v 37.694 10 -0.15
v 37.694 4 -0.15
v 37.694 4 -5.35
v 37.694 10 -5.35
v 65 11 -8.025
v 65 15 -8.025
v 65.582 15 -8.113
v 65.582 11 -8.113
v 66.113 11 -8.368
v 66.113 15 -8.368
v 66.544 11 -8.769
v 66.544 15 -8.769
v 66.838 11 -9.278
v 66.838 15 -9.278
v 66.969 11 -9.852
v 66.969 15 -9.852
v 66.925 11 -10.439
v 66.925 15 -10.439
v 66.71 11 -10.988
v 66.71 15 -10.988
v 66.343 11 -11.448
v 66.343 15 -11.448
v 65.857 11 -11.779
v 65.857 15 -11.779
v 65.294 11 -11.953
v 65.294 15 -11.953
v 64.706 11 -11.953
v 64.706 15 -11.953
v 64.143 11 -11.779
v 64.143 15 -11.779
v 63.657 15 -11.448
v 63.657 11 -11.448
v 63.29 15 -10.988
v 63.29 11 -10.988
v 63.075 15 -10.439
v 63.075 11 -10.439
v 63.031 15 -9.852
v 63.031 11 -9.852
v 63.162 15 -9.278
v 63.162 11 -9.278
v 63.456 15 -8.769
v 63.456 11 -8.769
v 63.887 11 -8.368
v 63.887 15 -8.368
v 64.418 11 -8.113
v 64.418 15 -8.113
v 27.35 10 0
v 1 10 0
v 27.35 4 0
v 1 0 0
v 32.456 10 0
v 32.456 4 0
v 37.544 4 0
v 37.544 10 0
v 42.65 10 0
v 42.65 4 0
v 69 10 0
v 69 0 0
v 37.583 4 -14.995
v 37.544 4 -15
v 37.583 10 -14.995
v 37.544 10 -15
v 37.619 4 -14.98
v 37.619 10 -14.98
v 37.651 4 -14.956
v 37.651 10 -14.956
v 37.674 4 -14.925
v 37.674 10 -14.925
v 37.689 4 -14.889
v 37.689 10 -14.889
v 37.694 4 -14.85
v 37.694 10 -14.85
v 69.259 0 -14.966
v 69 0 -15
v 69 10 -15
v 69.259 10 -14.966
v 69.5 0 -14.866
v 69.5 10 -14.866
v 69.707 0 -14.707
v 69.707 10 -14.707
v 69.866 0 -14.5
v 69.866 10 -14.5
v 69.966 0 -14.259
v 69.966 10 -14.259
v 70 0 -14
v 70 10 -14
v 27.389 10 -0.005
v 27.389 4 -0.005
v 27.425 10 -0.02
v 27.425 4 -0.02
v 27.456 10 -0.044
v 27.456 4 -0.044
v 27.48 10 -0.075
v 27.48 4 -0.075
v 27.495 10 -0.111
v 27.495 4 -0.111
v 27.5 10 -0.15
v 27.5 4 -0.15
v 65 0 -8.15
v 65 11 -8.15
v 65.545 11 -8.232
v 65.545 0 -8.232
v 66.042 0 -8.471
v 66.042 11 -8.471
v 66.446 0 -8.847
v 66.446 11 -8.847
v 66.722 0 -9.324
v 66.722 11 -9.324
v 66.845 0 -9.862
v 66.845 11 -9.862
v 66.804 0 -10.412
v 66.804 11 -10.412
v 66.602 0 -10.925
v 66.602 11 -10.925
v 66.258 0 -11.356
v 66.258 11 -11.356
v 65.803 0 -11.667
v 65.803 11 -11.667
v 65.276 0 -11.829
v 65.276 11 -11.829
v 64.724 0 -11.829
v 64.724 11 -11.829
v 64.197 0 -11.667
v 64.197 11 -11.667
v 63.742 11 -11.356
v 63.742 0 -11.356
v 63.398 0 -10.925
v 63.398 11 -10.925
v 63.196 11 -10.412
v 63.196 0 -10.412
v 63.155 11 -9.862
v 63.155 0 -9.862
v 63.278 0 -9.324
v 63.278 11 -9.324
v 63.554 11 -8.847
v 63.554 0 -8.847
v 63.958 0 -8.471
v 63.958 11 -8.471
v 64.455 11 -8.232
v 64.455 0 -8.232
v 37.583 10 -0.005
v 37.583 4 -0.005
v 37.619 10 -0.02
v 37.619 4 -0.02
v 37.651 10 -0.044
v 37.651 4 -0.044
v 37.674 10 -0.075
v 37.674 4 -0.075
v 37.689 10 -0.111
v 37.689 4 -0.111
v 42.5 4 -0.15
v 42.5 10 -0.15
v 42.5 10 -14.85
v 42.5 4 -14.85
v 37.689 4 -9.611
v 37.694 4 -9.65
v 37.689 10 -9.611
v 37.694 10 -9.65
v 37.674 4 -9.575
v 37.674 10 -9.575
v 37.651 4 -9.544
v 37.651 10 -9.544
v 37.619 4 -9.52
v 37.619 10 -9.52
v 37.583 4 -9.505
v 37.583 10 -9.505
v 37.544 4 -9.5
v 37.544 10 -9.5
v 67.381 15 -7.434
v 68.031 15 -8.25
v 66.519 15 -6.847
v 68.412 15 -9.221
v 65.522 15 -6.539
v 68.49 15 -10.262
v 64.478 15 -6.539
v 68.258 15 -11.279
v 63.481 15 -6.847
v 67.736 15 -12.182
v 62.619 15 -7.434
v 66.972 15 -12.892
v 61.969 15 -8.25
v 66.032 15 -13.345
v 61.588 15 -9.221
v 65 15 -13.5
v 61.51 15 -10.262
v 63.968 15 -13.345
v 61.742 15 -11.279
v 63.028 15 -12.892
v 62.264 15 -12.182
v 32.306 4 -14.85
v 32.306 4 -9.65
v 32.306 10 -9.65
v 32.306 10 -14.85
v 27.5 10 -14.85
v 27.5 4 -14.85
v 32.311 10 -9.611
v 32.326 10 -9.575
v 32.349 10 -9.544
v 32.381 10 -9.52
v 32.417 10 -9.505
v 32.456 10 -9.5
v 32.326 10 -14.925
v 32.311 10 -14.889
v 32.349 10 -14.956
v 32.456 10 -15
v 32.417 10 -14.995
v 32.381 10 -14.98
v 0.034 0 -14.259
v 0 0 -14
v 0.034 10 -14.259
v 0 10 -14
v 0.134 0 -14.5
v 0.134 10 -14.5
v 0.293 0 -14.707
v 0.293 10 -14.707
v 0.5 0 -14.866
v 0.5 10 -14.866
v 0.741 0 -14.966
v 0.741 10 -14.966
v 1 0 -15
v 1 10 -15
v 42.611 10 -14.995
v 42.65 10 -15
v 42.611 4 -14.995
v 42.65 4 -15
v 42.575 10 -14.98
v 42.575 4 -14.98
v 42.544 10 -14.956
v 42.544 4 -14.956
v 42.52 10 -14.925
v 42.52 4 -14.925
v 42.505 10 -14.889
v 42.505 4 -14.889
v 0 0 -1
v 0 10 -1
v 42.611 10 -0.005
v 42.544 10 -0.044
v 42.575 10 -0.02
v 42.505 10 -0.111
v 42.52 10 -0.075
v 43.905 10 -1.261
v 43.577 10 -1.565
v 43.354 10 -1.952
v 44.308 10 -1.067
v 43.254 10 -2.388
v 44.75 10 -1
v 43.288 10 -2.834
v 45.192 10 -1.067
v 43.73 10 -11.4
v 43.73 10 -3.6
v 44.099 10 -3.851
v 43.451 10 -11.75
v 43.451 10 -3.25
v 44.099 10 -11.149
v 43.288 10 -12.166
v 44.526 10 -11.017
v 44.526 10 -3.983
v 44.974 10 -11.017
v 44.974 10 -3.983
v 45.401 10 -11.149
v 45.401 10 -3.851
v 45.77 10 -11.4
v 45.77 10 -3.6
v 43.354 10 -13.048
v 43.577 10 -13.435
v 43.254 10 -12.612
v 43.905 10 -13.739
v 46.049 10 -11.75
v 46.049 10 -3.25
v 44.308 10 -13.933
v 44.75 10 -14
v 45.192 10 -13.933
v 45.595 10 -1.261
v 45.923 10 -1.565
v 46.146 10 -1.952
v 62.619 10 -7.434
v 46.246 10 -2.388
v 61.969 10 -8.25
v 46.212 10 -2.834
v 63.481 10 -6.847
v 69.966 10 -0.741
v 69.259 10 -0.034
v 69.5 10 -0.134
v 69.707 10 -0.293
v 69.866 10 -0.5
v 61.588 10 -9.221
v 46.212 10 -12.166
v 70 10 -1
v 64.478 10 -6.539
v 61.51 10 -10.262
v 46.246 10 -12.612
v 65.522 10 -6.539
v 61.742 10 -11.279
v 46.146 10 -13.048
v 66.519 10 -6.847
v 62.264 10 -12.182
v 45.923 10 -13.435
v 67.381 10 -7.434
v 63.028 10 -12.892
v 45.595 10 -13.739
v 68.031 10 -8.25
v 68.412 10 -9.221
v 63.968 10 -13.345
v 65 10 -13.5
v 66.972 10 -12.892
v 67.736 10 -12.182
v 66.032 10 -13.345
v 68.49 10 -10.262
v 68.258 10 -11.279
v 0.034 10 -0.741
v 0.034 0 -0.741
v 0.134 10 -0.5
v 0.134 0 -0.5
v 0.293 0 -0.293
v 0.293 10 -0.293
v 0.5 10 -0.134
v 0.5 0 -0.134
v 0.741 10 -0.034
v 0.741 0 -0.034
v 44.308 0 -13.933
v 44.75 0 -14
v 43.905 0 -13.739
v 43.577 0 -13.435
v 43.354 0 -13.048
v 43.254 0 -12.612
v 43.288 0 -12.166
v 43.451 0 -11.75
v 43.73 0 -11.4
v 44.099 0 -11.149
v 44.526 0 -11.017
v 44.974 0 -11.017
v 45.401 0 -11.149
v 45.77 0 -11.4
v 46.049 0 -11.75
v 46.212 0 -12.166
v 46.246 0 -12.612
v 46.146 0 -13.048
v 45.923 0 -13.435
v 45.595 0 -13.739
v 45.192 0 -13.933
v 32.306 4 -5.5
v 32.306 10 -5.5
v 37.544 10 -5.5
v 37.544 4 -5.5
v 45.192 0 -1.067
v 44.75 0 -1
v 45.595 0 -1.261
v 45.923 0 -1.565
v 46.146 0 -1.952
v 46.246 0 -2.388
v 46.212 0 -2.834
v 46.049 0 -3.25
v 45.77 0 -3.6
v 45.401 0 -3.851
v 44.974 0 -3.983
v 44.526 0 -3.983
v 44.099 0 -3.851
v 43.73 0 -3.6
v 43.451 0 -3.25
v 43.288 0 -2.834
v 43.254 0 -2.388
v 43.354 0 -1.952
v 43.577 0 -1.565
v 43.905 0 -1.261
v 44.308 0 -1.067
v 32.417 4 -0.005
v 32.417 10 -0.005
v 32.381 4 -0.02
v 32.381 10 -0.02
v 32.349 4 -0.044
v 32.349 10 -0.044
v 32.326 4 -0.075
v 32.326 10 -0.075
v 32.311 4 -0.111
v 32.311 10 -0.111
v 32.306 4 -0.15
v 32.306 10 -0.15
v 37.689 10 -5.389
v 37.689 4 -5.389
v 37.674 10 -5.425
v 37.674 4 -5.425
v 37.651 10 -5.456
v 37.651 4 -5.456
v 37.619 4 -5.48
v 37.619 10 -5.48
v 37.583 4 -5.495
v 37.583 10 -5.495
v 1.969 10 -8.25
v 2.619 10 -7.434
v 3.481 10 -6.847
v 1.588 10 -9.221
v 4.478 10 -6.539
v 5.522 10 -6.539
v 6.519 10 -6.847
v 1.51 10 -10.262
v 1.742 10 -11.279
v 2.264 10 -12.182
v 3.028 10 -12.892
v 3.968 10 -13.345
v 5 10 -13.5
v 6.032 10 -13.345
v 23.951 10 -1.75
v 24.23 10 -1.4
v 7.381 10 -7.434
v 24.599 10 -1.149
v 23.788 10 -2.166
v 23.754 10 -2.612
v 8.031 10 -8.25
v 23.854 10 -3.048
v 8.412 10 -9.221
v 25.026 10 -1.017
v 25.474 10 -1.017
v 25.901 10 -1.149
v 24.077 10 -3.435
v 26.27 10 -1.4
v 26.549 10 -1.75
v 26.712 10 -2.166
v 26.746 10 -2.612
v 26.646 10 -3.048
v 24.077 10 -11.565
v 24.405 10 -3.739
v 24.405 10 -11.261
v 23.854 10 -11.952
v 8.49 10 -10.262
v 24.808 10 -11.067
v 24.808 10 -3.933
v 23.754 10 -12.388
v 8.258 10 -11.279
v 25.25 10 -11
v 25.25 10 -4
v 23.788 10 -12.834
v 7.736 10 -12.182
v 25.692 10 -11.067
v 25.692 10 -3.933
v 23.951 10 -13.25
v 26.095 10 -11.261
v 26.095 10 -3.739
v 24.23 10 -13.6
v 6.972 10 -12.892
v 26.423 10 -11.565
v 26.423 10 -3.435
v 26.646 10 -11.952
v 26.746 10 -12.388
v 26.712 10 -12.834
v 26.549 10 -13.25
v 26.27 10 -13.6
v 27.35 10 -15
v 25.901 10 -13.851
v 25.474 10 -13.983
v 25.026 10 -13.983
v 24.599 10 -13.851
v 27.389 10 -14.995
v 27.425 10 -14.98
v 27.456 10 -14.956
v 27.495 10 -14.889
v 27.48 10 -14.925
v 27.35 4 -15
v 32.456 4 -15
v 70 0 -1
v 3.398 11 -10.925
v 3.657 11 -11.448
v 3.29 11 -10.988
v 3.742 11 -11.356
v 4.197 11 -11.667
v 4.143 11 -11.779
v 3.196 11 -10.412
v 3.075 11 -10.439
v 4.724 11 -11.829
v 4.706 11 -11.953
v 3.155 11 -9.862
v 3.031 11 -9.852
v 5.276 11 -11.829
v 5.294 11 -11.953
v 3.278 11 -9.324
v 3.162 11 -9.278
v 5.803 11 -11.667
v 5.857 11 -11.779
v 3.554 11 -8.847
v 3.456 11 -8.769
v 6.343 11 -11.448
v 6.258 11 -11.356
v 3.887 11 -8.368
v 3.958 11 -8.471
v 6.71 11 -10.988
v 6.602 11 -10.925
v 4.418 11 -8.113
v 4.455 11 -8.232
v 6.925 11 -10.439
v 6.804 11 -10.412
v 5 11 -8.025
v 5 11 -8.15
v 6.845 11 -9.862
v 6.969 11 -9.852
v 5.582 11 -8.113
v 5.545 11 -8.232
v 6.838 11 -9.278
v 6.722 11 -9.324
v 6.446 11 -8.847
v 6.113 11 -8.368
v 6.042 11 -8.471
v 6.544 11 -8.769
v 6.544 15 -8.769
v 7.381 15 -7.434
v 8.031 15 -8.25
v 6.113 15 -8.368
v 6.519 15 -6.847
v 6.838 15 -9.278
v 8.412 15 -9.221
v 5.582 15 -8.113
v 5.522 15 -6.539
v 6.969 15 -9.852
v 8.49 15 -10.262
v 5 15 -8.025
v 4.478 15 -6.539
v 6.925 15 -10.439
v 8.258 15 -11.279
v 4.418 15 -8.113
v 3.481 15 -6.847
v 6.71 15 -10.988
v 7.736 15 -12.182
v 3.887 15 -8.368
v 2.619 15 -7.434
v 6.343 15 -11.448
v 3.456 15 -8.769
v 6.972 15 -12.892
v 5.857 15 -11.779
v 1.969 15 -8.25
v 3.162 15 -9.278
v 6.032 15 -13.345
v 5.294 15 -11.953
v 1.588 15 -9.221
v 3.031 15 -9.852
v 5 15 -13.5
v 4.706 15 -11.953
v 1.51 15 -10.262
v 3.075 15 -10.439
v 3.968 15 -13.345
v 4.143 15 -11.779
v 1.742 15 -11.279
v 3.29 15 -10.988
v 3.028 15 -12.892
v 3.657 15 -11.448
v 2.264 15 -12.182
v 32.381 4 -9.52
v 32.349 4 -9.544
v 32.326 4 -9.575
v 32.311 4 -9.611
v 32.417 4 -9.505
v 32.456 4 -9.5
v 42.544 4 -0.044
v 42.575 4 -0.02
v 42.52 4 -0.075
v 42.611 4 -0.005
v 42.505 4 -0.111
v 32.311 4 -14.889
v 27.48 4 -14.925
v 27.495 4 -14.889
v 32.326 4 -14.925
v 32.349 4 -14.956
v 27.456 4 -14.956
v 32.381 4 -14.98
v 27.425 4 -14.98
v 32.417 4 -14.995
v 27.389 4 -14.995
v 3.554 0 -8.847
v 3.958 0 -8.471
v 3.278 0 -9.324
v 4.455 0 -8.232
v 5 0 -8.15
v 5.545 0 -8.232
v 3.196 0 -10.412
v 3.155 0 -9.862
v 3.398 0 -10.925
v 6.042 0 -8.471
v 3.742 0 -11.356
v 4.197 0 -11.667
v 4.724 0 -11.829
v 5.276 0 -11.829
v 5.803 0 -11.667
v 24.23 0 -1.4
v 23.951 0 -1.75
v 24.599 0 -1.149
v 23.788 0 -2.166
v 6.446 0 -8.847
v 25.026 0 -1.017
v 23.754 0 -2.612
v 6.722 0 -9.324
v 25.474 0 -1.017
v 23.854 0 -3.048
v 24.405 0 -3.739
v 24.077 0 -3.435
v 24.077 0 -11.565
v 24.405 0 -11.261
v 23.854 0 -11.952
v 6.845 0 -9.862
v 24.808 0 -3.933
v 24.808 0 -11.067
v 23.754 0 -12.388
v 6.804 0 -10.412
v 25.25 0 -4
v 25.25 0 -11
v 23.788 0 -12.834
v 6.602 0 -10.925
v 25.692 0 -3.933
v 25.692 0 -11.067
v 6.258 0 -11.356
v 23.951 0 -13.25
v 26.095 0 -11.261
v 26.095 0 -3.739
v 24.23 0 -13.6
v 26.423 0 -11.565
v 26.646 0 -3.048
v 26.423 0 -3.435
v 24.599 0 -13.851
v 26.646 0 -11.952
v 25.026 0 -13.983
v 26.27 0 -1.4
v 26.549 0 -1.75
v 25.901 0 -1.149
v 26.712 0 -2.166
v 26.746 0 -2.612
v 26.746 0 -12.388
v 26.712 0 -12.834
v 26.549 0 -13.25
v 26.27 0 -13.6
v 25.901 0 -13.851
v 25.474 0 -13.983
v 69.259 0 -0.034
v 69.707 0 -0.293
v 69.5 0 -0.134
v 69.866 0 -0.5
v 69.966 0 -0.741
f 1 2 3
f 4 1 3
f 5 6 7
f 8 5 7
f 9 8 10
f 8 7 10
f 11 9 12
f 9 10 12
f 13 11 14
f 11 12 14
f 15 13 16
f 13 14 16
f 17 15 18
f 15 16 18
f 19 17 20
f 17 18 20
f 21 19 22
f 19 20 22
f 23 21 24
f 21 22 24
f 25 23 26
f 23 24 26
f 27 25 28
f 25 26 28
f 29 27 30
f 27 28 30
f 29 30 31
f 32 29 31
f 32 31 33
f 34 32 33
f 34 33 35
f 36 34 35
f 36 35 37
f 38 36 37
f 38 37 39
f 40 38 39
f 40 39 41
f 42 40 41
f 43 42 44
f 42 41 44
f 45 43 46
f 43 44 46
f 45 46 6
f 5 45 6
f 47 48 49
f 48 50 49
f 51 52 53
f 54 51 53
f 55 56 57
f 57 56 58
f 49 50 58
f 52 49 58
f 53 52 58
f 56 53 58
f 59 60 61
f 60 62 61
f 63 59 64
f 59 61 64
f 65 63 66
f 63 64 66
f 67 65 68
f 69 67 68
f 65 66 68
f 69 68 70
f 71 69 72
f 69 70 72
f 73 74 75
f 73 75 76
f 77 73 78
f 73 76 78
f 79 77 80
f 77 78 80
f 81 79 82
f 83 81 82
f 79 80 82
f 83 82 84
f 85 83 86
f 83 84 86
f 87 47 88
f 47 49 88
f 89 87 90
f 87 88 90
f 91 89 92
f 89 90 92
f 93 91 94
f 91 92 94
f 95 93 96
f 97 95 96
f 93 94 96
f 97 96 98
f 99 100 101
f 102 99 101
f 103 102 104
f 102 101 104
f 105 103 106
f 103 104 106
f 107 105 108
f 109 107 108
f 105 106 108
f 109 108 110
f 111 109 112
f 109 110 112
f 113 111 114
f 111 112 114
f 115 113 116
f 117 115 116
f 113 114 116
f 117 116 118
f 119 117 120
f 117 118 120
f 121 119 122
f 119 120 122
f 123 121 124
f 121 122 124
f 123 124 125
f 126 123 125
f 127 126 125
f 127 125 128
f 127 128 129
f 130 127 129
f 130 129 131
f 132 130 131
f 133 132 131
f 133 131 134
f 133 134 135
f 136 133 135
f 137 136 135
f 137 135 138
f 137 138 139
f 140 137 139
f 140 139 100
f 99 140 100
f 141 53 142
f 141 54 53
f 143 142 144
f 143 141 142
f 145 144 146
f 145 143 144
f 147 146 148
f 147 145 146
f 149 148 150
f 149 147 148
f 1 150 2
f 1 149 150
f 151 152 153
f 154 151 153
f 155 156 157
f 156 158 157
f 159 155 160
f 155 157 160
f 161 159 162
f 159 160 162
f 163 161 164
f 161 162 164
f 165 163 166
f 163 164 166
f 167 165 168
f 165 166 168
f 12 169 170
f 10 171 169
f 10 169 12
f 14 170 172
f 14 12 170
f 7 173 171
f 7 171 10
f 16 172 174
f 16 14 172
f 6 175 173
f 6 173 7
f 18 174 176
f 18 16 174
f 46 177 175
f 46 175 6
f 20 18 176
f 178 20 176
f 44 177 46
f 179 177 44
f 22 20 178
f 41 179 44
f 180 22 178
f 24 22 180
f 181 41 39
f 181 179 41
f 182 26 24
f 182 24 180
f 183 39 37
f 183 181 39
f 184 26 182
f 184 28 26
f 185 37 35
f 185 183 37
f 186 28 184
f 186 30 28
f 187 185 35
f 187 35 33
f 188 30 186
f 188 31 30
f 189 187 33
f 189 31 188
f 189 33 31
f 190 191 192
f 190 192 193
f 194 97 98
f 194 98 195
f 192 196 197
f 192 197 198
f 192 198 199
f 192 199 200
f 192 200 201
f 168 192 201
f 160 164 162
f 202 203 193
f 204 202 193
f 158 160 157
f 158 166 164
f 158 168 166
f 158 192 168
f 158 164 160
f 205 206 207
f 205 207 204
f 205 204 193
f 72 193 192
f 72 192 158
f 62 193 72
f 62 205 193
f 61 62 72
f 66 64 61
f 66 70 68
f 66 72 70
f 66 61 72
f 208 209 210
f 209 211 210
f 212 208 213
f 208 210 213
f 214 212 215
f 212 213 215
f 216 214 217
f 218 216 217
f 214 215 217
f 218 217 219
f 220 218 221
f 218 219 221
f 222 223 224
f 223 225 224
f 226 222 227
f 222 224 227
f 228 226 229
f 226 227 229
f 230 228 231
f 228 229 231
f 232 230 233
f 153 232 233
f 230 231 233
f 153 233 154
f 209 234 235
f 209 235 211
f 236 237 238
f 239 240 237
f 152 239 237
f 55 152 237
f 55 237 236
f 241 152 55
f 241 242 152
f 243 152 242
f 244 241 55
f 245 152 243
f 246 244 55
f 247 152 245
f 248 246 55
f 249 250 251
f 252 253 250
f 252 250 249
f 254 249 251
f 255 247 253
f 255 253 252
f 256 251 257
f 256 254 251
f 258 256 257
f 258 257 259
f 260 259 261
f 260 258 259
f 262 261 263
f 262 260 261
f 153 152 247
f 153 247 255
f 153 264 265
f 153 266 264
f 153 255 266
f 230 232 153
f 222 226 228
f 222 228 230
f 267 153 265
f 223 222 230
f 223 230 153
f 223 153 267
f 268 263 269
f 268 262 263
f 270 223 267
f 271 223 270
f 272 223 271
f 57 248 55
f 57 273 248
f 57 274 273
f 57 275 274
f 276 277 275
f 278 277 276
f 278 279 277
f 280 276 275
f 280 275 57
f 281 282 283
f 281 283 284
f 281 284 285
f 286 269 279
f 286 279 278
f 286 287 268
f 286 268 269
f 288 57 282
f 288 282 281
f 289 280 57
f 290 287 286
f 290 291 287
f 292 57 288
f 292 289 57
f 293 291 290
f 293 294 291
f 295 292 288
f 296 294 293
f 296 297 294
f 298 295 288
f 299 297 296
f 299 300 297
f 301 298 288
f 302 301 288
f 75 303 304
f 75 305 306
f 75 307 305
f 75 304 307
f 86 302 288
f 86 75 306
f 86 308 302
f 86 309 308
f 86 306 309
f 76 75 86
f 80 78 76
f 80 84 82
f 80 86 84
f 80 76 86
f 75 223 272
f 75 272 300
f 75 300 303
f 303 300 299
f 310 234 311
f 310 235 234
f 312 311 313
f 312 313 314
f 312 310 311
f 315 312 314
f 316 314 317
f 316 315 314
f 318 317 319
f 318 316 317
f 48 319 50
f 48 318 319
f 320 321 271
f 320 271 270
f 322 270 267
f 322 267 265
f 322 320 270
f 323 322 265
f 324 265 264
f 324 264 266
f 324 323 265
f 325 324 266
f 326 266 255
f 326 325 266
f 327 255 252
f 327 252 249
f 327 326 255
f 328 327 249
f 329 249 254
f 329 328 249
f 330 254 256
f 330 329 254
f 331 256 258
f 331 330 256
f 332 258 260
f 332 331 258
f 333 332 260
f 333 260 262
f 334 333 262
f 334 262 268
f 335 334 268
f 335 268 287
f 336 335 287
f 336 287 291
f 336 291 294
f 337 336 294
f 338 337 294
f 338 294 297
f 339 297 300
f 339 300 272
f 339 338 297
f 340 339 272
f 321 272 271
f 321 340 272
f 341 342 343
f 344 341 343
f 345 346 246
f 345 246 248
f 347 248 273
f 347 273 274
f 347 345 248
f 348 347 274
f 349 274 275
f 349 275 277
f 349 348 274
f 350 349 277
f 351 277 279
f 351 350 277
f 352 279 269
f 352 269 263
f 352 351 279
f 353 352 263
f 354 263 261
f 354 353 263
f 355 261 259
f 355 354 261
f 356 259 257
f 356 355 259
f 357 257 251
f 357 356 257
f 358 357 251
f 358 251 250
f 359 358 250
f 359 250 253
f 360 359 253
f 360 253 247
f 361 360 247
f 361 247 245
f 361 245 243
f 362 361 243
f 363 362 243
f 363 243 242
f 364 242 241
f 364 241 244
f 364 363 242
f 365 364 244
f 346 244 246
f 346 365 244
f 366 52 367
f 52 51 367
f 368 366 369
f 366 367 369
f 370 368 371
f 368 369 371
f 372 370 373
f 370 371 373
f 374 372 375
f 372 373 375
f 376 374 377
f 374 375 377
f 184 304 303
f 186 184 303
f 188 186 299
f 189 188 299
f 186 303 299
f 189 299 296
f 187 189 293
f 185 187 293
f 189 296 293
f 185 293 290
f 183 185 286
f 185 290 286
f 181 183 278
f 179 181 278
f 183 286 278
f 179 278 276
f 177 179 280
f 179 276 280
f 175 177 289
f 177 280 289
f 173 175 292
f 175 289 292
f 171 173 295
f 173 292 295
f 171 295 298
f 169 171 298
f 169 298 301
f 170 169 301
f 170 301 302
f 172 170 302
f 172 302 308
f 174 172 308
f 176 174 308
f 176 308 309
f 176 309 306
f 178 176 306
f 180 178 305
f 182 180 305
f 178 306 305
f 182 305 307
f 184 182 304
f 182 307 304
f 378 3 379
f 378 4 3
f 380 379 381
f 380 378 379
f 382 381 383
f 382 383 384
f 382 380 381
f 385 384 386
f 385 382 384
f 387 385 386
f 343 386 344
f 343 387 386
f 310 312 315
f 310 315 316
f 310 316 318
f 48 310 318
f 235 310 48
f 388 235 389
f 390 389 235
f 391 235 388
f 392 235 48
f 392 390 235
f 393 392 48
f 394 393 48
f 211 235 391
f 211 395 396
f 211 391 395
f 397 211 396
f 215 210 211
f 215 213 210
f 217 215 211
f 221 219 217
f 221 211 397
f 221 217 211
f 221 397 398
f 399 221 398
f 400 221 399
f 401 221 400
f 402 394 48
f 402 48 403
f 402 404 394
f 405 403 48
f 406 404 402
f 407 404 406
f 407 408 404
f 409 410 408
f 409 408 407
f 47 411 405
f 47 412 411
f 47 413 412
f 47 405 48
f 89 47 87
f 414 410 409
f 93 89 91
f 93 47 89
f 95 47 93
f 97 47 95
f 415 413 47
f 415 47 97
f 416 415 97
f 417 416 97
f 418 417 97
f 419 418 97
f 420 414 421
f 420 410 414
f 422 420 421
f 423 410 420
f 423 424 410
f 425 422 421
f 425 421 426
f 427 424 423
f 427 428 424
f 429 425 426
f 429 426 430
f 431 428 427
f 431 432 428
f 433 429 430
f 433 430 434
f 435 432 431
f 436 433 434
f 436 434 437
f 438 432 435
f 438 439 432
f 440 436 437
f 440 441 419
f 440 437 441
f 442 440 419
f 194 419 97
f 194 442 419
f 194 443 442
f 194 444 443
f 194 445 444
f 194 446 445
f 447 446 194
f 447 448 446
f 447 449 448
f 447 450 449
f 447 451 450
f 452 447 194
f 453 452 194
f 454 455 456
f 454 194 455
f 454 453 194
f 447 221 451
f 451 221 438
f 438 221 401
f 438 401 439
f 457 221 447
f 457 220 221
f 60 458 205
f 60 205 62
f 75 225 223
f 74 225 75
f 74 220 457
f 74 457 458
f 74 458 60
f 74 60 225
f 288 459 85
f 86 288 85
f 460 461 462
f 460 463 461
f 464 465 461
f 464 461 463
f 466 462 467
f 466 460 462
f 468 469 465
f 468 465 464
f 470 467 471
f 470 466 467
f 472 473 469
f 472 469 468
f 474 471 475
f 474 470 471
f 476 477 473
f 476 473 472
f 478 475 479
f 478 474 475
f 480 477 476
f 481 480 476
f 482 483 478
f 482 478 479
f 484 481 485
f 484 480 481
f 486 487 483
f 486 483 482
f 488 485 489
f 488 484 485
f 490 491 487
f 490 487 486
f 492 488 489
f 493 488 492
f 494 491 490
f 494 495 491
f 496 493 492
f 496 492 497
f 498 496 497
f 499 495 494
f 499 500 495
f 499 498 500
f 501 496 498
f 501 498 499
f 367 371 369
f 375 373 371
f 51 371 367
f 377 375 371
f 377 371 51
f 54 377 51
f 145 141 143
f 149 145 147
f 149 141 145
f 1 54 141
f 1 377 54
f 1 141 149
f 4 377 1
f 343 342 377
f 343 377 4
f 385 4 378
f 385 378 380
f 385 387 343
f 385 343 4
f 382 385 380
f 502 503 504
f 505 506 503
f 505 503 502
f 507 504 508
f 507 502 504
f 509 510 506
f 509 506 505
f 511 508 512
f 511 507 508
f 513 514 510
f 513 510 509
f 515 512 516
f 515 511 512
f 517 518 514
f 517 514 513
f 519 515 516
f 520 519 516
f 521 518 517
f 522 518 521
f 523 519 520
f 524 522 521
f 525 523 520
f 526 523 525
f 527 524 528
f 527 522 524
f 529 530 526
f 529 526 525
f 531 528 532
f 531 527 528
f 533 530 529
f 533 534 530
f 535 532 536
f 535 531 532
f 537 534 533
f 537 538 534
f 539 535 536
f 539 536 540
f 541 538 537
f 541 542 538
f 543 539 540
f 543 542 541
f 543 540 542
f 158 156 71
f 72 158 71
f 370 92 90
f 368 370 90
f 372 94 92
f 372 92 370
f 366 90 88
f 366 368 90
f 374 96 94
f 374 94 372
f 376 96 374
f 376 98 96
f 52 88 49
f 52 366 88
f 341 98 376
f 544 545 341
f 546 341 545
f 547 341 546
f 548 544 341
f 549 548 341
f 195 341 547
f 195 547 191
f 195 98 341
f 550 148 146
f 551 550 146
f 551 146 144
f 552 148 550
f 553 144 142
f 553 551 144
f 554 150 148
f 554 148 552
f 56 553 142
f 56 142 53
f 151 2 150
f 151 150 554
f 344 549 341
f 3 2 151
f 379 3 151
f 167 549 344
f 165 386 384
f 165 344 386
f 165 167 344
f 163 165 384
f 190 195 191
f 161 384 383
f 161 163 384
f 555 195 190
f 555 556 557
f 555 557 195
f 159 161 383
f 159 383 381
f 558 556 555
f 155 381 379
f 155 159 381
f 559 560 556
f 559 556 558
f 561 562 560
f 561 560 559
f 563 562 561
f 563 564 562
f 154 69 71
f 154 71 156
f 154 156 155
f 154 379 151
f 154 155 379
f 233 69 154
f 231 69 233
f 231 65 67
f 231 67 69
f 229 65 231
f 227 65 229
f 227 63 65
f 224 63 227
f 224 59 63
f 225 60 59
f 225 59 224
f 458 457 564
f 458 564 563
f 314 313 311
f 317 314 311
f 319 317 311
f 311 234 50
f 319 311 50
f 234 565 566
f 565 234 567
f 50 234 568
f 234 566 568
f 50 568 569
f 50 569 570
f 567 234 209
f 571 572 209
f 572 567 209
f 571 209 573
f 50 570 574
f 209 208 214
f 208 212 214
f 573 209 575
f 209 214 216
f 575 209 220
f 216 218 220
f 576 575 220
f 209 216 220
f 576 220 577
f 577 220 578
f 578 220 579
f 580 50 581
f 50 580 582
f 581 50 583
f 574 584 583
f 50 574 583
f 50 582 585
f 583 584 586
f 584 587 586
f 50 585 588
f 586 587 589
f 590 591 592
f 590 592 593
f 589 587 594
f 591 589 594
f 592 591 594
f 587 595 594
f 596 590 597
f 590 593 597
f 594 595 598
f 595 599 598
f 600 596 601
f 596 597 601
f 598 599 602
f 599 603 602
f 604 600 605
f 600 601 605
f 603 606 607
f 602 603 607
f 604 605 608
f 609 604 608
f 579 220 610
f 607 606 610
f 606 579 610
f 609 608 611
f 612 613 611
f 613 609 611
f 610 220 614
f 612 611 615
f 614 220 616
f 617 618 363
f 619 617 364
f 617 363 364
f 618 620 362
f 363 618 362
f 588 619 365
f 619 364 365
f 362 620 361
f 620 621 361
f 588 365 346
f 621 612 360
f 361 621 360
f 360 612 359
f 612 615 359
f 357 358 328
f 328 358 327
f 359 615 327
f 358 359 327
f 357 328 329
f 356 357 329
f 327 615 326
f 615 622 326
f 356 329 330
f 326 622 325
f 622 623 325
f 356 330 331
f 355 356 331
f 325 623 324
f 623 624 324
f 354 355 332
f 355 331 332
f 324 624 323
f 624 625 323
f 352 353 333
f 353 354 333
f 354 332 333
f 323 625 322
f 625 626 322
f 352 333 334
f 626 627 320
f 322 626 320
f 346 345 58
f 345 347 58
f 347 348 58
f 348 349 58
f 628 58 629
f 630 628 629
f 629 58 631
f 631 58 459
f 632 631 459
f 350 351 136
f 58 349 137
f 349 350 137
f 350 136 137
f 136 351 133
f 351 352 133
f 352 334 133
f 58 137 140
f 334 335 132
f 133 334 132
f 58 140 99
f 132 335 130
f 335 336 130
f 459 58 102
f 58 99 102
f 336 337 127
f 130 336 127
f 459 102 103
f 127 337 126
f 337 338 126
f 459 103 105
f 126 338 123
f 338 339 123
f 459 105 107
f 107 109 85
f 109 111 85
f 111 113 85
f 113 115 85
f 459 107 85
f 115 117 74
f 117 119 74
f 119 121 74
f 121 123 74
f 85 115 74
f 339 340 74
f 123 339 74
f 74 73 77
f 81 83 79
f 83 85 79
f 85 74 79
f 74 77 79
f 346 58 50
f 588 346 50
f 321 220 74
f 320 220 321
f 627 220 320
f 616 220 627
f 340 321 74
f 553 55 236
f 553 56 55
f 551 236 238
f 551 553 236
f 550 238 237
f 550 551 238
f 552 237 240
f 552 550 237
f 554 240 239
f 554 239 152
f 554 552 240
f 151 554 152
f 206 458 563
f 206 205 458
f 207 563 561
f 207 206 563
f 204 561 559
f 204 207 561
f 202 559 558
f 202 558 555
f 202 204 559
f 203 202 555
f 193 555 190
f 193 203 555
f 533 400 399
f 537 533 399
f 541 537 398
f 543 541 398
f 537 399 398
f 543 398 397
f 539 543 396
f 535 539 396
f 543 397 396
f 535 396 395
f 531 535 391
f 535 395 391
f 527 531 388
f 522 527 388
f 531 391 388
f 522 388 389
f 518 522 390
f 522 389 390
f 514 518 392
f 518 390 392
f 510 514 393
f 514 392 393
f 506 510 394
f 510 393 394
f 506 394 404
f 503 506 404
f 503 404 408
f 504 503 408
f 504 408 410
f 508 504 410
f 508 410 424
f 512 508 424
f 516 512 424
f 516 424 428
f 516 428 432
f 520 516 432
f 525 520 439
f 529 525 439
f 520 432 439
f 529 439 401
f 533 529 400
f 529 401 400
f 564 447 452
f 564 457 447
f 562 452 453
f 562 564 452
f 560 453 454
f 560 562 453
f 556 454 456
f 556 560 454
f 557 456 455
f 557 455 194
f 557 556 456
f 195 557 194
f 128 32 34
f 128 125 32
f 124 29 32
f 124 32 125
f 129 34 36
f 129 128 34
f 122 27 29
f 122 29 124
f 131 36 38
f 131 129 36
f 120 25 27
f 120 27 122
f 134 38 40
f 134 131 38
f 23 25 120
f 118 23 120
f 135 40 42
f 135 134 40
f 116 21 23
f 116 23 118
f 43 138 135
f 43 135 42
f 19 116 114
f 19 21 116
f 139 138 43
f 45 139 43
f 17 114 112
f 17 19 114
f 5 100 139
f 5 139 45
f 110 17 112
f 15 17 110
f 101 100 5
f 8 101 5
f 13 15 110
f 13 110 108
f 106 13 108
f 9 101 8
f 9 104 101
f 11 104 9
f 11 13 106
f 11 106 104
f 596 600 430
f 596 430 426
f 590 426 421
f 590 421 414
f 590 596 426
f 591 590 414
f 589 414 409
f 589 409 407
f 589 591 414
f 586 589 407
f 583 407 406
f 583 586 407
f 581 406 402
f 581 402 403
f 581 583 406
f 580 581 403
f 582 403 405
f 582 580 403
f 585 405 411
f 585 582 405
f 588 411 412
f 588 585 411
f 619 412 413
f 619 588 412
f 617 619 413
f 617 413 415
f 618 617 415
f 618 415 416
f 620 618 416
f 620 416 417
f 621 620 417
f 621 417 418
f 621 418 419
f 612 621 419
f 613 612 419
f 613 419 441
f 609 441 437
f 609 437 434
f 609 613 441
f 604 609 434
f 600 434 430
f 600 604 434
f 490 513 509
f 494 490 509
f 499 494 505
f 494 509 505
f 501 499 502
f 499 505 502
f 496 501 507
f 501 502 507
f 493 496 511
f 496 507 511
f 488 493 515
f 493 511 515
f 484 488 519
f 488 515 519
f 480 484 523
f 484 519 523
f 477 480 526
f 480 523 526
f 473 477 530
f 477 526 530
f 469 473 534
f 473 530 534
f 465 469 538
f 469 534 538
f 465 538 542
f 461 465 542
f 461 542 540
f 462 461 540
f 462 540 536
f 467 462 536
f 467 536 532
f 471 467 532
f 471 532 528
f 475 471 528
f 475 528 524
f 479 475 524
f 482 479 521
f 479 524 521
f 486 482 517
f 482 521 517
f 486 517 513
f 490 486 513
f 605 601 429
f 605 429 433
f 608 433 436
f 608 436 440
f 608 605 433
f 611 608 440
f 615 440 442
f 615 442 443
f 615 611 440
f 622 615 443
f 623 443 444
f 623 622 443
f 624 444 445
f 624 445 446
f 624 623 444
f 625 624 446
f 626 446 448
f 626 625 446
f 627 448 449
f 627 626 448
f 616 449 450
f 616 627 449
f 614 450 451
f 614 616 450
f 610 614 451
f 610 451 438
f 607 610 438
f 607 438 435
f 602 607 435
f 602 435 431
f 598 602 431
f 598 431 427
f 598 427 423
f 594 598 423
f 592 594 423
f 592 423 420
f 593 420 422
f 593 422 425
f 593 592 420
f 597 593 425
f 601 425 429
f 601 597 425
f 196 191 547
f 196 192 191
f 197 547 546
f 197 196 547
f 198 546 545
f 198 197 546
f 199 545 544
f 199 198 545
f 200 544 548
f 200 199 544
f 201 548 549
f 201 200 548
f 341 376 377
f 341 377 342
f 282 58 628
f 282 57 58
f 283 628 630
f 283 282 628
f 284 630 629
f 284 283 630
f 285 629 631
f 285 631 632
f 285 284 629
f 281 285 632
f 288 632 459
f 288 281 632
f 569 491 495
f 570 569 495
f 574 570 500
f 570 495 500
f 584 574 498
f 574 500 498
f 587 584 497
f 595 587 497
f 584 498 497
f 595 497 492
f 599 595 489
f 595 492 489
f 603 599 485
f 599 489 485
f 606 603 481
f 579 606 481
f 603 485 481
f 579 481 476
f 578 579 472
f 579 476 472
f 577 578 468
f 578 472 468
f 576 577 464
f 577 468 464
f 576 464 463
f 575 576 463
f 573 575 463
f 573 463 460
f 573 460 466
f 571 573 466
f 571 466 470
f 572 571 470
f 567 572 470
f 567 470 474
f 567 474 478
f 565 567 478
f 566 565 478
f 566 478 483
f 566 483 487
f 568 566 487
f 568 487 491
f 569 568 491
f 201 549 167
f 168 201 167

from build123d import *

# Parameters (mm, degrees)
SKETCH1_W           = 70
SKETCH1_H           = 15
SKETCH1_R           = 1.75
SKETCH1_R_2         = 1.5
BOSS_EXTRUDE1_DEPTH = 10
SKETCH2_W           = 15
SKETCH2_H           = 15
CUT_EXTRUDE1_DEPTH  = 6
SKETCH3_W           = 5.388877434
SKETCH3_H           = 5.5
BOSS_EXTRUDE2_DEPTH = 6
FILLET1_R           = 1
FILLET2_R           = 0.15
SKETCH4_R           = 3.5
SKETCH4_R_2         = 1.75
BOSS_EXTRUDE3_DEPTH = 5
SKETCH5_R           = 1.85
CUT_EXTRUDE2_DEPTH  = 74.143694192
SKETCH6_R           = 1.975
CUT_EXTRUDE3_DEPTH  = 4


with BuildPart() as part:
    # Sketch1 → Boss-Extrude1 (new body)
    with BuildSketch(Plane(origin=(0, 0, 0), x_dir=(1, 0, 0), z_dir=(0, 1, 0))):
        with Locations((35, 7.5)):
            Rectangle(SKETCH1_W, SKETCH1_H)
        with Locations(Location((5, 10, 0), (0, 0, 270))):
            Circle(SKETCH1_R, mode=Mode.SUBTRACT)
        with Locations(Location((65, 10, 0), (0, 0, 270))):
            Circle(SKETCH1_R, mode=Mode.SUBTRACT)
        with Locations(Location((25.25, 12.5, 0), (0, 0, 270))):
            Circle(SKETCH1_R_2, mode=Mode.SUBTRACT)
        with Locations(Location((44.75, 12.5, 0), (0, 0, 90))):
            Circle(SKETCH1_R_2, mode=Mode.SUBTRACT)
        with Locations(Location((44.75, 2.5, 0), (0, 0, 270))):
            Circle(SKETCH1_R_2, mode=Mode.SUBTRACT)
        with Locations(Location((25.25, 2.5, 0), (0, 0, 90))):
            Circle(SKETCH1_R_2, mode=Mode.SUBTRACT)
    extrude(amount=BOSS_EXTRUDE1_DEPTH)

    # Sketch2 → Cut-Extrude1 (cut)
    with BuildSketch(Plane(origin=(0, 10, 0), x_dir=(1, 0, 0), z_dir=(0, 1, 0))):
        with Locations((35, 7.5)):
            Rectangle(SKETCH2_W, SKETCH2_H)
    extrude(amount=-CUT_EXTRUDE1_DEPTH, mode=Mode.SUBTRACT)

    # Sketch3 → Boss-Extrude2 (add)
    with BuildSketch(Plane(origin=(0, 4, 0), x_dir=(1, 0, 0), z_dir=(0, 1, 0))):
        with Locations((35, 12.25)):
            Rectangle(SKETCH3_W, SKETCH3_H)
        with Locations((35, 2.75)):
            Rectangle(SKETCH3_W, SKETCH3_H)
    extrude(amount=BOSS_EXTRUDE2_DEPTH)

    # Fillet1
    fillet1_edges = [part.edges().sort_by_distance(p)[0] for p in [
        (0, 5, -15),
        (70, 5, -15),
        (70, 5, 0),
        (0, 5, 0),
    ]]
    fillet(fillet1_edges, radius=FILLET1_R)

    # Fillet2
    fillet2_edges = [part.edges().sort_by_distance(p)[0] for p in [
        (27.5, 7, 0),
        (27.5, 7, -15),
        (42.5, 7, -15),
        (42.5, 7, 0),
        (32.305561283, 7, -15),
        (32.305561283, 7, -9.5),
        (37.694438717, 7, -9.5),
        (37.694438717, 7, -15),
        (32.305561283, 7, 0),
        (37.694438717, 7, 0),
        (37.694438717, 7, -5.5),
    ]]
    fillet(fillet2_edges, radius=FILLET2_R)

    # Sketch4 → Boss-Extrude3 (add)
    # profile 1 of 2: a face of its own
    with BuildSketch(Plane(origin=(0, 10, 0), x_dir=(1, 0, 0), z_dir=(0, 1, 0))):
        with Locations(Location((5, 10, 0), (0, 0, 90))):
            Circle(SKETCH4_R)
        with Locations(Location((5, 10, 0), (0, 0, 90))):
            Circle(SKETCH4_R_2, mode=Mode.SUBTRACT)
    # profile 2 of 2: a face of its own
    with BuildSketch(Plane(origin=(0, 10, 0), x_dir=(1, 0, 0), z_dir=(0, 1, 0))):
        with Locations(Location((65, 10, 0), (0, 0, 90))):
            Circle(SKETCH4_R)
        with Locations(Location((65, 10, 0), (0, 0, 90))):
            Circle(SKETCH4_R_2, mode=Mode.SUBTRACT)
    extrude(amount=BOSS_EXTRUDE3_DEPTH)

    # Sketch5 → Cut-Extrude2 (cut, through all)
    with BuildSketch(Plane(origin=(0, 15, 0), x_dir=(1, 0, 0), z_dir=(0, 1, 0))):
        with Locations(Location((5, 10, 0), (0, 0, 270))):
            Circle(SKETCH5_R)
        with Locations(Location((65, 10, 0), (0, 0, 270))):
            Circle(SKETCH5_R)
    extrude(amount=-CUT_EXTRUDE2_DEPTH, mode=Mode.SUBTRACT)

    # Sketch6 → Cut-Extrude3 (cut)
    with BuildSketch(Plane(origin=(0, 15, 0), x_dir=(1, 0, 0), z_dir=(0, 1, 0))):
        with Locations(Location((5, 10, 0), (0, 0, 270))):
            Circle(SKETCH6_R)
        with Locations(Location((65, 10, 0), (0, 0, 270))):
            Circle(SKETCH6_R)
    extrude(amount=-CUT_EXTRUDE3_DEPTH, mode=Mode.SUBTRACT)


solid = part.part
